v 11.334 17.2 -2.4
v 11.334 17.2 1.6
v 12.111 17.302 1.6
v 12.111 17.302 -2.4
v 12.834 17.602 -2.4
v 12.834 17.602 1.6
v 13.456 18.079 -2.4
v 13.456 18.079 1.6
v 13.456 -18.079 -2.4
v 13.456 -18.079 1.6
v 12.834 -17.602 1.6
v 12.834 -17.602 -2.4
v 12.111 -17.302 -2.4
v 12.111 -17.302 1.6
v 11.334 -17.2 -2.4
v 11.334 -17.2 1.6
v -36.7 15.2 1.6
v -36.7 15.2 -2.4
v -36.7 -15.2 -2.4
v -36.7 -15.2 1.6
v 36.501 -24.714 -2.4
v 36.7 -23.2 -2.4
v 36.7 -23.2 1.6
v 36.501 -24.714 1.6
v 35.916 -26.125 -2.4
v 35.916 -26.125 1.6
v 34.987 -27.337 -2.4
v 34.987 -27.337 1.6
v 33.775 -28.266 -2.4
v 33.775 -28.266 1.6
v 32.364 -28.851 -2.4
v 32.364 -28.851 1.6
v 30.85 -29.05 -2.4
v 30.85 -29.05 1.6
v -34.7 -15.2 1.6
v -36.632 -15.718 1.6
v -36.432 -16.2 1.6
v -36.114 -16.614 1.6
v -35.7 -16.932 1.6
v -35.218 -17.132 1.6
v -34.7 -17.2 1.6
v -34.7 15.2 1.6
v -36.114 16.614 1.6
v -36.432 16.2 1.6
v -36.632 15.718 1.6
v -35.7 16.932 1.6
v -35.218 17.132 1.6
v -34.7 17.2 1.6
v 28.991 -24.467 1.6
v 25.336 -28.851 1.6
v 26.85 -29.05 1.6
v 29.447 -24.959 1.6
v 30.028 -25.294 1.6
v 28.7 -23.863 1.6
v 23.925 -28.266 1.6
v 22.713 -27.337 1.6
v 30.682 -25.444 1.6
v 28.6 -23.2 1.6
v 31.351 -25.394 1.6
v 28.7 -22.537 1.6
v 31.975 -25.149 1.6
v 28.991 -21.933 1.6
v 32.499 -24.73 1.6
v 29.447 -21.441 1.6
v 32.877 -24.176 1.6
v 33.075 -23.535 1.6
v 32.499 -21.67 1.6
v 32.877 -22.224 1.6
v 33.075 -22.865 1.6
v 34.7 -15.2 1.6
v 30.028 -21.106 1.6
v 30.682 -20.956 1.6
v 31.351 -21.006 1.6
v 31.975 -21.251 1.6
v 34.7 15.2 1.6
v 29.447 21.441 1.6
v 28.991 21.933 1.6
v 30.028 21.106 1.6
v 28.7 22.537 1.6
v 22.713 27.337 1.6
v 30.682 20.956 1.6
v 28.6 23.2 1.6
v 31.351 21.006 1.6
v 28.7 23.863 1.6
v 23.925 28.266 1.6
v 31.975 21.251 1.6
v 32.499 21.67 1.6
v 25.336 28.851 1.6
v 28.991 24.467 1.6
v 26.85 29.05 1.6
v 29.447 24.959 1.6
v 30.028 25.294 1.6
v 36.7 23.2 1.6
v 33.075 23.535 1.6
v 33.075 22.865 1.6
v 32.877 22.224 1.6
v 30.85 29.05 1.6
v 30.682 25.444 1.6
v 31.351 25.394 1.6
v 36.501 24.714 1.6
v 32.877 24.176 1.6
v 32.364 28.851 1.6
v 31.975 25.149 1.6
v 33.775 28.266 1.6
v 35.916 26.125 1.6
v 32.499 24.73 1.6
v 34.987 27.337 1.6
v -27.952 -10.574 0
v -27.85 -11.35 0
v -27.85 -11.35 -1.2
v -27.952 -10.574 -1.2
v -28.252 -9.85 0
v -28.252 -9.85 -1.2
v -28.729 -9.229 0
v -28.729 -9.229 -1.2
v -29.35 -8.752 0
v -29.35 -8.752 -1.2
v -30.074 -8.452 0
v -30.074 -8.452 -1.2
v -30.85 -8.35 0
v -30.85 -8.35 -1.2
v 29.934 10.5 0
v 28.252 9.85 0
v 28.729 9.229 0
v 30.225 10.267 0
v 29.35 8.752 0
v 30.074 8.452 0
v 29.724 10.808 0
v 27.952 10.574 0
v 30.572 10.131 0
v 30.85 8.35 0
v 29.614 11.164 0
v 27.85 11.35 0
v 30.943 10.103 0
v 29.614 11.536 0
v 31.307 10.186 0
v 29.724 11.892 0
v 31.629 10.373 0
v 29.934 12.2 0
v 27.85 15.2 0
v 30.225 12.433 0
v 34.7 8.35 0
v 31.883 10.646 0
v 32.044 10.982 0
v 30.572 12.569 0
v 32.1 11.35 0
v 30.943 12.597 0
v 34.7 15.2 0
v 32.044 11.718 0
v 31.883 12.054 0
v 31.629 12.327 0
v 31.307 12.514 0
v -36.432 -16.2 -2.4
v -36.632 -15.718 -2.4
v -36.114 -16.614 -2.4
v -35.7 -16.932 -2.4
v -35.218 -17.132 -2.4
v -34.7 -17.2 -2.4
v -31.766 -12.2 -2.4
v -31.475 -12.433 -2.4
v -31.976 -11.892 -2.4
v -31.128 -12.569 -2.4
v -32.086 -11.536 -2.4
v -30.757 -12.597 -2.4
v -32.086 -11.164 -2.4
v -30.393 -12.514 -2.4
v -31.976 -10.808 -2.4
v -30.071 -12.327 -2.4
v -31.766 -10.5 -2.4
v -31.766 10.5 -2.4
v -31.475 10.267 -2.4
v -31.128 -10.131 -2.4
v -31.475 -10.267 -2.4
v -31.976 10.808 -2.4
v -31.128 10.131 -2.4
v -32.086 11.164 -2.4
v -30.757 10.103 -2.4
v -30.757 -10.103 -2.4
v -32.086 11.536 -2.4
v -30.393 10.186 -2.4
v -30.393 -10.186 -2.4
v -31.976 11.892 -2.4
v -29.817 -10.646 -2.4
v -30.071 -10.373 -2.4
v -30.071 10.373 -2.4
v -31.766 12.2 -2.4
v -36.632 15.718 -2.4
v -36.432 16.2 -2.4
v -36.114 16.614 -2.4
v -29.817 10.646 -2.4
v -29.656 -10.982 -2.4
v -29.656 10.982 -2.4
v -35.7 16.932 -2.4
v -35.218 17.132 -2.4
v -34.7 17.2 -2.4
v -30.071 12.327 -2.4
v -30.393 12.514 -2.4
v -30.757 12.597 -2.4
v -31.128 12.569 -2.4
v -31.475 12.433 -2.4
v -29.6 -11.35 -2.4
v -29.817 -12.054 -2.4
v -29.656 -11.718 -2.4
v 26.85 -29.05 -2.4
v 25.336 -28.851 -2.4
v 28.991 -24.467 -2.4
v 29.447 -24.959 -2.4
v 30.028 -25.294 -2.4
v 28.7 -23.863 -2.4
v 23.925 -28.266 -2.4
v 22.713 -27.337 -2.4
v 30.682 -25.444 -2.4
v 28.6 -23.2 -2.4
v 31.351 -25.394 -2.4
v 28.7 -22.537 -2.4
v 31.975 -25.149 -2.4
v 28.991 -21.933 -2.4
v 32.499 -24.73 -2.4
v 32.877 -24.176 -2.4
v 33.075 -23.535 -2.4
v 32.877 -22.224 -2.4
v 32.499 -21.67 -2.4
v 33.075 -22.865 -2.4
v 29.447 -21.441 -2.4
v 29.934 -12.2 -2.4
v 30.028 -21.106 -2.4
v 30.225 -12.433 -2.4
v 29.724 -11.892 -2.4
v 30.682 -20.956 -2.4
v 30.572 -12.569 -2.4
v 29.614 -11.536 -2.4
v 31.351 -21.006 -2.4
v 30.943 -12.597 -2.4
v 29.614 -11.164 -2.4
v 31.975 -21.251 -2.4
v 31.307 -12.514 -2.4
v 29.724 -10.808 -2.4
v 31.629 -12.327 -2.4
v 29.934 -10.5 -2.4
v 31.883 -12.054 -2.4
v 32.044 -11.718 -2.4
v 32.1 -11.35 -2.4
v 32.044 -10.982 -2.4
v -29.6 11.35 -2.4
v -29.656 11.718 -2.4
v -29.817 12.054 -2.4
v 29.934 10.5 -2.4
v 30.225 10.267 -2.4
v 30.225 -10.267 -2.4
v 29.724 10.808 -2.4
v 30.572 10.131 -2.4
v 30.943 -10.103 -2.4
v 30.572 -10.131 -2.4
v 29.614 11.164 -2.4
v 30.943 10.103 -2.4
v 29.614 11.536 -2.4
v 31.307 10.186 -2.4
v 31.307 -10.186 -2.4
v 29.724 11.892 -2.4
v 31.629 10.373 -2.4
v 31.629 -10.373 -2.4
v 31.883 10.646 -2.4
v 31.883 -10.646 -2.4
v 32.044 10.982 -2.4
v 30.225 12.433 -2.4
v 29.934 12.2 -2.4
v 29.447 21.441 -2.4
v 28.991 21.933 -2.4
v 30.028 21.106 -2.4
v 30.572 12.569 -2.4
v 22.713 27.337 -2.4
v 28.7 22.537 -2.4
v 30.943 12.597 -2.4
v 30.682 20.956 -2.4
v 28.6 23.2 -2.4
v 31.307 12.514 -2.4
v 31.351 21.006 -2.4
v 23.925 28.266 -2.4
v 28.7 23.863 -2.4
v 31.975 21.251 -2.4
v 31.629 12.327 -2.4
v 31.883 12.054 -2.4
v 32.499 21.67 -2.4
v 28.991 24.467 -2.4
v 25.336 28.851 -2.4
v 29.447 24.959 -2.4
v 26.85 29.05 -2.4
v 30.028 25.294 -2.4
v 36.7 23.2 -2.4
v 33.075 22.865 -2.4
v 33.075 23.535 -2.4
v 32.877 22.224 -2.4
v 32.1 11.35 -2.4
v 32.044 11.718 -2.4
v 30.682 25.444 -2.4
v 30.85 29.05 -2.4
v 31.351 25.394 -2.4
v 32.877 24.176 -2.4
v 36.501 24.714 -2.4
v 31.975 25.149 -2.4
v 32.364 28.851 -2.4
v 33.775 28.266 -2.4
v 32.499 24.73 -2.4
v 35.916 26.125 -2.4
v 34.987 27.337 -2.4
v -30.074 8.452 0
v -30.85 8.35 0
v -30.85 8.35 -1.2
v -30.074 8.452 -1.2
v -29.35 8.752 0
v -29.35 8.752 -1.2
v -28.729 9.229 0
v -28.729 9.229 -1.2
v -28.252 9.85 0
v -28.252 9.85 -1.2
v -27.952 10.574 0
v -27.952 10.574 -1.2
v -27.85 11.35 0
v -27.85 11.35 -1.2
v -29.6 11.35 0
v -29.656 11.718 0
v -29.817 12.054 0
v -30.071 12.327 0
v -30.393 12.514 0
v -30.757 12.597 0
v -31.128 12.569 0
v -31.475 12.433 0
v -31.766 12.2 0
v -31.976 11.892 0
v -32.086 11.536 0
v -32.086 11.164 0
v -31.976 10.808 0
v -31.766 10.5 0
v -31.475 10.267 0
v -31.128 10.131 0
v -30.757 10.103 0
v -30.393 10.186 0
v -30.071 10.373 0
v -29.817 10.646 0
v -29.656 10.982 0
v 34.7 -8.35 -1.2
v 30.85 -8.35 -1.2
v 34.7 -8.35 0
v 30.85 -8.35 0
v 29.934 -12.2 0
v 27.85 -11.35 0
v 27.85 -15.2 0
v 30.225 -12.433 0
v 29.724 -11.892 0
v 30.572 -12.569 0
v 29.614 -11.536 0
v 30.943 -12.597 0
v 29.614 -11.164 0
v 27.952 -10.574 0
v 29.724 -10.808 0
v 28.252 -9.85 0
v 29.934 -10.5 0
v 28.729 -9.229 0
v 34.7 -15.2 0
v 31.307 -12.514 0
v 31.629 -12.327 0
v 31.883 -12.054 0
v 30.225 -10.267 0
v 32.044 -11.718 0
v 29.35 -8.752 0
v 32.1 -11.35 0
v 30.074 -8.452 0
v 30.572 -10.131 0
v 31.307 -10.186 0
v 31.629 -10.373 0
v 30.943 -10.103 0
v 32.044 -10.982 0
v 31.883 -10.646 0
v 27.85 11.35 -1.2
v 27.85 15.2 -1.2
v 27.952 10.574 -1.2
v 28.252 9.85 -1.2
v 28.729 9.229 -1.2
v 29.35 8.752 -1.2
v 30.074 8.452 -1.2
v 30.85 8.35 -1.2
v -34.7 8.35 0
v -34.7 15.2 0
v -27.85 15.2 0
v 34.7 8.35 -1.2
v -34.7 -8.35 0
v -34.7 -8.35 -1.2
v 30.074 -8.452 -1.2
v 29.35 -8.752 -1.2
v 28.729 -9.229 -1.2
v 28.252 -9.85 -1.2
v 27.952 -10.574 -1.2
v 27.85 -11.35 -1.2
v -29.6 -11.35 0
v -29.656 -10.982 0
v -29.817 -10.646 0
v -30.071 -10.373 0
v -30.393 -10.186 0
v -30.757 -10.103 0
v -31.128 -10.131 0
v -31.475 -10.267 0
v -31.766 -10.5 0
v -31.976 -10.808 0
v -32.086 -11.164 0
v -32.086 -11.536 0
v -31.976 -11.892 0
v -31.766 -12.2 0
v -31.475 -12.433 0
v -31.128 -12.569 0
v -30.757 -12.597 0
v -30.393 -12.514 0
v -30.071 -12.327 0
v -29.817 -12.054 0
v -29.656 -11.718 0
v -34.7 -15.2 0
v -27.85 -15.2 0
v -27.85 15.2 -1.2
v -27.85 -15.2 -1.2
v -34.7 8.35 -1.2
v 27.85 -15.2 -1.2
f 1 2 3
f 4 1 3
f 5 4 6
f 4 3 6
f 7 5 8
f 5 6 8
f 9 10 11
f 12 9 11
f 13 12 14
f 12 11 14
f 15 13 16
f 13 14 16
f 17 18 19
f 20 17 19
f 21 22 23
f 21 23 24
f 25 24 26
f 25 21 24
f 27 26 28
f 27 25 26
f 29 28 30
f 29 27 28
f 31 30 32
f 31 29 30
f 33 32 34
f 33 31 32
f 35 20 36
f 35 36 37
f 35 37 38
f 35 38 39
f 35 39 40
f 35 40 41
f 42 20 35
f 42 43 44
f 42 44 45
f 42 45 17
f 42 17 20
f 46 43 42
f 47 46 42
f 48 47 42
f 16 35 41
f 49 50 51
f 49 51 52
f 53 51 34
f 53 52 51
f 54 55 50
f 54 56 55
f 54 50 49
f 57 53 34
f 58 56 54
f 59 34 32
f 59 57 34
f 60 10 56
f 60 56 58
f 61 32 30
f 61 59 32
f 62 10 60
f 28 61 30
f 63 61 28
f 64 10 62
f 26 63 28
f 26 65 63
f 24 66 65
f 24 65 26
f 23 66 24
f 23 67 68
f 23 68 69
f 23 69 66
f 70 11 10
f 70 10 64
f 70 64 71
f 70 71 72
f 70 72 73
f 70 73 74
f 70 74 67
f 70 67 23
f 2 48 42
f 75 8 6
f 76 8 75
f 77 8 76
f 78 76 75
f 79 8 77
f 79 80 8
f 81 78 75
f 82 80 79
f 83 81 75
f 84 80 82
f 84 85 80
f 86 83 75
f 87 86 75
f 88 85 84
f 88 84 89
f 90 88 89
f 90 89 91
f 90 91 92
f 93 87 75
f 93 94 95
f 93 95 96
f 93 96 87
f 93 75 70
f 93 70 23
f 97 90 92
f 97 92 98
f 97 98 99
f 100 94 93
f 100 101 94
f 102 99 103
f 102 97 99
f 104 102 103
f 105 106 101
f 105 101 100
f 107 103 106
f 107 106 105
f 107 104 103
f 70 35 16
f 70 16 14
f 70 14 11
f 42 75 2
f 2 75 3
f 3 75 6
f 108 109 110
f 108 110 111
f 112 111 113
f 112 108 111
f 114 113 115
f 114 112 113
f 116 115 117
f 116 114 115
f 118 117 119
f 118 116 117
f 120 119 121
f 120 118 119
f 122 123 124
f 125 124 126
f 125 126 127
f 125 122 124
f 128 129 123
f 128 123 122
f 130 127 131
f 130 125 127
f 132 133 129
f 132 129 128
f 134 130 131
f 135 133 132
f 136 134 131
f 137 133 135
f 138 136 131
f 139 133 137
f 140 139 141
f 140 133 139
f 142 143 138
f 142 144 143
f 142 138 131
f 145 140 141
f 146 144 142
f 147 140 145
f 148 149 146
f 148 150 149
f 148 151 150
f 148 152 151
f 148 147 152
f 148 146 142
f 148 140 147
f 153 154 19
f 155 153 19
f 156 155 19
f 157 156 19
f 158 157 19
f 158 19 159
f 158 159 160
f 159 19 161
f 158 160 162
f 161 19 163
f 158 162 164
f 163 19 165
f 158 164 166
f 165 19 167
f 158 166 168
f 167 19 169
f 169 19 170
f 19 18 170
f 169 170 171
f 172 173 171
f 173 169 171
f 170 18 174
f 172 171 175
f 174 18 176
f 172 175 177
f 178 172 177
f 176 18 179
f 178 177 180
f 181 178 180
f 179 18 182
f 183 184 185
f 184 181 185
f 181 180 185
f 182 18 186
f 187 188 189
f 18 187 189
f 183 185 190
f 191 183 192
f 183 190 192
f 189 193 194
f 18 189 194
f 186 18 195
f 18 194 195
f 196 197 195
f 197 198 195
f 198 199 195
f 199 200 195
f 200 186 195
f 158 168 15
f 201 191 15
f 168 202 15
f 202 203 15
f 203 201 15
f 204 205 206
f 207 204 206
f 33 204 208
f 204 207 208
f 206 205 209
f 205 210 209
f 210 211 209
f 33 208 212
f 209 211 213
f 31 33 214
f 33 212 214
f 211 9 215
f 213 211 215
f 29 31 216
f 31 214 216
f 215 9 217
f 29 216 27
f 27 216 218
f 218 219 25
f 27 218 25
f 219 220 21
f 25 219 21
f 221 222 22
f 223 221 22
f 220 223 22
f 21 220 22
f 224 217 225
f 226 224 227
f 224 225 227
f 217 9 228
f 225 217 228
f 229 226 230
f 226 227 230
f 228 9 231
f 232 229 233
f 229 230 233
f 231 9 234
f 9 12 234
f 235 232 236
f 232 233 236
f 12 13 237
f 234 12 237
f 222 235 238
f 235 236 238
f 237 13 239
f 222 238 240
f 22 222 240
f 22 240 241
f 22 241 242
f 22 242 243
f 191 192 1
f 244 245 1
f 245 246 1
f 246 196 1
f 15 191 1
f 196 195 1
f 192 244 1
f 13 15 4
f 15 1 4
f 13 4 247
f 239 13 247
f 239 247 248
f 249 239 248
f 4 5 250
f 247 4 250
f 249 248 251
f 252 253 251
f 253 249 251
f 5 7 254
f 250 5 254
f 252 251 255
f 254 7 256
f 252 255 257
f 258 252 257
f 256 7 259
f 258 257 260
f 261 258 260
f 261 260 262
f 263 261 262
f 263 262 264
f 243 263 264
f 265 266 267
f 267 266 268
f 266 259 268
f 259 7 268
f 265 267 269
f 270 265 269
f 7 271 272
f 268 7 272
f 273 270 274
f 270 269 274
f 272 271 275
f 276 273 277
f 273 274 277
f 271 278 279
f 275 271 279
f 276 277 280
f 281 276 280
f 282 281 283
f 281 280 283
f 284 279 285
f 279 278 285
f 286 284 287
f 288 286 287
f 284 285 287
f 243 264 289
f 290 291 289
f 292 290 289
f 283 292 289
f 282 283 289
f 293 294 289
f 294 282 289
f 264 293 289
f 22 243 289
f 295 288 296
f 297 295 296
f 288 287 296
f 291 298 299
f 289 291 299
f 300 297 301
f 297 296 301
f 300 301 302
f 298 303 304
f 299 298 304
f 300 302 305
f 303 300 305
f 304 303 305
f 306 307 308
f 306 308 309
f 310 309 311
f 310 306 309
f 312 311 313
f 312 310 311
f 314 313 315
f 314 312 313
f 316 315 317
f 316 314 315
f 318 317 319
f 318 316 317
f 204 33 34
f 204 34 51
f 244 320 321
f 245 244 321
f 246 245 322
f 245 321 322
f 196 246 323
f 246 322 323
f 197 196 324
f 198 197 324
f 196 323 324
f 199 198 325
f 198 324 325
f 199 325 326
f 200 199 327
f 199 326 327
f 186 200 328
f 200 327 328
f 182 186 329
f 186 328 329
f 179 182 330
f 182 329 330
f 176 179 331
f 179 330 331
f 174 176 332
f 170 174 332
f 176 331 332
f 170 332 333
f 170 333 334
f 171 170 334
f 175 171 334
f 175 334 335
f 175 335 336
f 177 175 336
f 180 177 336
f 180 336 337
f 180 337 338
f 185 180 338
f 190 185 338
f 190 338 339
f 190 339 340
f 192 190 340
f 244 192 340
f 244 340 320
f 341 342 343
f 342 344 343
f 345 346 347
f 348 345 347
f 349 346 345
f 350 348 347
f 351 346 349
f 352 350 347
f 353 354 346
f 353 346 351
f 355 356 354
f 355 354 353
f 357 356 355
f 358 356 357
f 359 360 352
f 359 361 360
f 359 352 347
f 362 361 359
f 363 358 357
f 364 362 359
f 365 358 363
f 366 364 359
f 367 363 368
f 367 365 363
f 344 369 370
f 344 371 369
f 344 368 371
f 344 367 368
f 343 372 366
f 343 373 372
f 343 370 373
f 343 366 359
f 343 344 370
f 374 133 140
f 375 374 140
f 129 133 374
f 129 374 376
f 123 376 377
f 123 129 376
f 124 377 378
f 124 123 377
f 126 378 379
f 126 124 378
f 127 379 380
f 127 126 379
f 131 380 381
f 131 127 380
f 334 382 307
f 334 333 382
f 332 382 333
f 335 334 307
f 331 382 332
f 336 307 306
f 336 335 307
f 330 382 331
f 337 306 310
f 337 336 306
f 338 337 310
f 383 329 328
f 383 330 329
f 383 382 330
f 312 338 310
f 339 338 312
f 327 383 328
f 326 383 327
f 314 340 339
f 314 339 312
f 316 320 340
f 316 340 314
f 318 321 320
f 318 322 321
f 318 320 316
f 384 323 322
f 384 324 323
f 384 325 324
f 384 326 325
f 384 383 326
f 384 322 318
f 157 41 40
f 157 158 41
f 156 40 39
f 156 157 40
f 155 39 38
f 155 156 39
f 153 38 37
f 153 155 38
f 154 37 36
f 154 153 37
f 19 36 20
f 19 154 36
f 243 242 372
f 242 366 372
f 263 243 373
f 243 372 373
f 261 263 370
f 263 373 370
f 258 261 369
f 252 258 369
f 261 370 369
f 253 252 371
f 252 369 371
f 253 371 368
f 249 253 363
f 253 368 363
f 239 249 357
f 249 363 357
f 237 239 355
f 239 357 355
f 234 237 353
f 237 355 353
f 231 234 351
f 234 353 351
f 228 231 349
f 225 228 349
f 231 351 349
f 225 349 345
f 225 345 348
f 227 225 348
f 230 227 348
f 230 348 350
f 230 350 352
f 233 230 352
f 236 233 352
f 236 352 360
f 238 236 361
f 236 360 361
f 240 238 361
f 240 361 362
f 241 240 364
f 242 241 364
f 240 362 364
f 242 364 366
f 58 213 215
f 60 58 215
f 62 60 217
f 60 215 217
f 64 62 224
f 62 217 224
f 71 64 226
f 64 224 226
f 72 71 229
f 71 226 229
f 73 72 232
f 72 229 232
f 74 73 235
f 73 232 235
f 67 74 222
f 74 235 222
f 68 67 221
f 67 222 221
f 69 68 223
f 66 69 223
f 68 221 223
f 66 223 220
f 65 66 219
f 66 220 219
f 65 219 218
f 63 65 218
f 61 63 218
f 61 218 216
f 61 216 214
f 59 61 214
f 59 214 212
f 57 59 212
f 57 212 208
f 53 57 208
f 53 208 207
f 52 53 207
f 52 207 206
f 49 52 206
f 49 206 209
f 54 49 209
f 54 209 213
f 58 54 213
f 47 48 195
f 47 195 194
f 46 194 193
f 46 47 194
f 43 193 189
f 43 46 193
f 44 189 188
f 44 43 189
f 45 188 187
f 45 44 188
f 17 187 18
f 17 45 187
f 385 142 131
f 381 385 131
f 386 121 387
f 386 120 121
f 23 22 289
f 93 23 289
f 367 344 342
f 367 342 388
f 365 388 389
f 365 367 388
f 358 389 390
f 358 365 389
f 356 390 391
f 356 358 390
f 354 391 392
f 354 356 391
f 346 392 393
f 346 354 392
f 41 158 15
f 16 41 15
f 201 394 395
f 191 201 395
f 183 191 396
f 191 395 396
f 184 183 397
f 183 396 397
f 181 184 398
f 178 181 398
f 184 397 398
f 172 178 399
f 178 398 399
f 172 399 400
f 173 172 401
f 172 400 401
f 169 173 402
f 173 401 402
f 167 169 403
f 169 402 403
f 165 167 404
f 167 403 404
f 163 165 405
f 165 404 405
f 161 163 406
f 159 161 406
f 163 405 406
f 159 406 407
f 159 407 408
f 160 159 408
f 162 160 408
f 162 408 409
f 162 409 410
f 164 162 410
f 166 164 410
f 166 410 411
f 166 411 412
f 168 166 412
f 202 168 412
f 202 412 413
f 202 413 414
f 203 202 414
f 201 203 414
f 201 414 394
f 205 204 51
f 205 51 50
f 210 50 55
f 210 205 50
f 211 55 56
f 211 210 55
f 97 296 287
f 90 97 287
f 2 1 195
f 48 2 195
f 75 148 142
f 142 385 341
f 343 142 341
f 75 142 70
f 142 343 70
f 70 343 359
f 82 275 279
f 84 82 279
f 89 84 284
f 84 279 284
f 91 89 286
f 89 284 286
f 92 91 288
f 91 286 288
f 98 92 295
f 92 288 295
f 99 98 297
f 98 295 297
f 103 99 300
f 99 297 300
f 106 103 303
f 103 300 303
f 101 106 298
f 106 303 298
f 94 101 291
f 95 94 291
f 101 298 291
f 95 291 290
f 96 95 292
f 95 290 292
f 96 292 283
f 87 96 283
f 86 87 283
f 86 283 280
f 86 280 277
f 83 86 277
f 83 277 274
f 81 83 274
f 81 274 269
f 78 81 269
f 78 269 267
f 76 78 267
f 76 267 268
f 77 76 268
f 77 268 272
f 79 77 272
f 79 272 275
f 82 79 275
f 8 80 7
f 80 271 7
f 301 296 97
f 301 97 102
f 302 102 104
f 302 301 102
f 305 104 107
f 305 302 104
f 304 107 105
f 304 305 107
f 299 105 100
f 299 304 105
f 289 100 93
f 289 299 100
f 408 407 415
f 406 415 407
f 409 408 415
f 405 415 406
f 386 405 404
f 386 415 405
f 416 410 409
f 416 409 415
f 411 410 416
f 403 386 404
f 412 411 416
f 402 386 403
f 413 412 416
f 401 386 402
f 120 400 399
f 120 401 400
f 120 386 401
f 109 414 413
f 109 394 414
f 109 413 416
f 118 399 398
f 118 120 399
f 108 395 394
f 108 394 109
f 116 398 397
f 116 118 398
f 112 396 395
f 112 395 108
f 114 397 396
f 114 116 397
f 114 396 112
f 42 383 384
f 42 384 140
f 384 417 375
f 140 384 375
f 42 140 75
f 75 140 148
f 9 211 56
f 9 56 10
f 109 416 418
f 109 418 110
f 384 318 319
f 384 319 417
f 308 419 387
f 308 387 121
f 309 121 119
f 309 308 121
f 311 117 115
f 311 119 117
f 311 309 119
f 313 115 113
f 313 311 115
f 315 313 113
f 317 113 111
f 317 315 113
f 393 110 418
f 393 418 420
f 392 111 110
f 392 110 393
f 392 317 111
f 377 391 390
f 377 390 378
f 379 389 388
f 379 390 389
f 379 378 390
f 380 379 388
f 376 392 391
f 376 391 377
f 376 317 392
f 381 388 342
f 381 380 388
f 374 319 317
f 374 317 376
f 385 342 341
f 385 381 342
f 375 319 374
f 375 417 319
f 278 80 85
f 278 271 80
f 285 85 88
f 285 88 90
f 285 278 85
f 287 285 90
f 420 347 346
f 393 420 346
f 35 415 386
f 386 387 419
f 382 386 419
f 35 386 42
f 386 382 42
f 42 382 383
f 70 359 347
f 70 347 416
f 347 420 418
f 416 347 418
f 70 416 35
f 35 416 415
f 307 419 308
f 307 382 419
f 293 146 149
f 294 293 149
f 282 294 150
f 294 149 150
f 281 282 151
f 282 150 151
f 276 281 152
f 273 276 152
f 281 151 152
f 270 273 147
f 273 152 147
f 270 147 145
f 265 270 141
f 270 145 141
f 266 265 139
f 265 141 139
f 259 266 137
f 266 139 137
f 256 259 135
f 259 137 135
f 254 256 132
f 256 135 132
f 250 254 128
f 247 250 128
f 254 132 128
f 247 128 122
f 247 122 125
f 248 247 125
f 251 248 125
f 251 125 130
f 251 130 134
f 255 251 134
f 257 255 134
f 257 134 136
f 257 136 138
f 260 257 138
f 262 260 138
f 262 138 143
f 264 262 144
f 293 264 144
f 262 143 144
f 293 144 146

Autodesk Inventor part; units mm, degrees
ref_plane "YZ Plane" through (0, 0, 0) normal (1, 0, 0) x (0, 1, 0)
ref_plane "XZ Plane" through (0, 0, 0) normal (0, 1, 0) x (-1, 0, 0)
ref_plane "XY Plane" through (0, 0, 0) normal (0, 0, 1) x (1, 0, 0)
sketch "スケッチ1" plane through (0, 0, 0) normal (0, 0, 1) x (1, 0, 0)
  line L0 (-34.7, 15.2) -> (34.7, 15.2)
  line L1 (34.7, 15.2) -> (34.7, -15.2)
  line L2 (34.7, -15.2) -> (-34.7, -15.2)
  line L3 (-34.7, -15.2) -> (-34.7, 15.2)
  line L4 (-30.85, 11.35) -> (30.85, 11.35) construction
  line L5 (30.85, 11.35) -> (30.85, -11.35) construction
  line L6 (30.85, -11.35) -> (-30.85, -11.35) construction
  line L7 (-30.85, -11.35) -> (-30.85, 11.35) construction
  circle A0 centre (-30.85, 11.35) radius 1.25
  circle A1 centre (-30.85, -11.35) radius 1.25
  circle A2 centre (30.85, -11.35) radius 1.25
  circle A3 centre (30.85, 11.35) radius 1.25
  line L8 (36.7, 17.2) -> (-36.7, 17.2)
  line L9 (-36.7, 17.2) -> (-36.7, -17.2)
  line L10 (-36.7, -17.2) -> (36.7, -17.2)
  line L11 (36.7, -17.2) -> (36.7, 17.2)
  point P0 (0, 0)
  point P1 (0, 15.2)
  point P2 (-34.7, 0)
  point P3 (0, 11.35)
  point P4 (-30.85, 0)
  dimension "d0" = 30.4
  dimension "d1" = 69.4
  dimension "d2" = 61.7
  dimension "d3" = 22.7
  dimension "d4" = 2.5
  dimension "d5" = 2
extrude "押し出し1" add sketch "スケッチ1" along normal blind 1.6 contours L11 L10 L9 L8
extrude "押し出し2" add sketch "スケッチ1" against normal blind 2.4 contours L0 L1 L2 L3 | L11 L10 L9 L8
sketch "スケッチ2" plane through (0, 0, 0) normal (0, 0, 1) x (1, 0, 0)
  circle A0 centre (-30.85, -11.35) radius 1.25 construction
  circle A1 centre (-30.85, 11.35) radius 1.25 construction
  circle A2 centre (30.85, -11.35) radius 1.25 construction
  circle A3 centre (30.85, 11.35) radius 1.25 construction
  line L0 (-34.7, -15.2) -> (-34.7, 15.2) projected
  line L1 (34.7, -15.2) -> (-34.7, -15.2) projected
  line L2 (-34.7, 15.2) -> (34.7, 15.2) projected
  line L3 (34.7, 15.2) -> (34.7, -15.2) projected
  line L4 (-27.85, -15.2) -> (-27.85, -11.35)
  arc A4 (-27.85, -11.35) -> (-30.85, -8.35) centre (-30.85, -11.35) ccw
  line L5 (-30.85, -8.35) -> (-34.7, -8.35)
  line L6 (-34.7, 8.35) -> (-30.85, 8.35)
  arc A5 (-30.85, 8.35) -> (-27.85, 11.35) centre (-30.85, 11.35) ccw
  line L7 (-27.85, 11.35) -> (-27.85, 15.2)
  line L8 (27.85, -15.2) -> (27.85, -11.35)
  arc A6 (30.85, -8.35) -> (27.85, -11.35) centre (30.85, -11.35) ccw
  line L9 (30.85, -8.35) -> (34.7, -8.35)
  line L10 (34.7, 8.35) -> (30.85, 8.35)
  arc A7 (27.85, 11.35) -> (30.85, 8.35) centre (30.85, 11.35) ccw
  line L11 (27.85, 11.35) -> (27.85, 15.2)
  point P0 (0, 0)
  dimension "d10" = 3
extrude "押し出し3" cut sketch "スケッチ2" against normal blind 1.2 contours L0 L6 A5 L7 L2 L11 A7 L10 L3 L9 A6 L8 L1 L4 A4 L5
sketch "スケッチ3" plane through (0, 0, -2.4) normal (0, 0, -1) x (-1, 0, 0)
  circle A0 centre (-30.85, 11.35) radius 1.25 construction
  circle A1 centre (-30.85, -11.35) radius 1.25 construction
  line L0 (-30.85, 23.2) -> (-30.85, -23.2) construction
  line L1 (-25, 23.2) -> (-25, -23.2)
  line L2 (-36.7, -23.2) -> (-36.7, 23.2)
  arc A2 (-25, 23.2) -> (-36.7, 23.2) centre (-30.85, 23.2) ccw
  arc A3 (-36.7, -23.2) -> (-25, -23.2) centre (-30.85, -23.2) ccw
  line L3 (36.7, 17.2) -> (-36.7, 17.2) projected
  line L4 (-36.7, -17.2) -> (36.7, -17.2) projected
  circle A4 centre (-30.85, 23.2) radius 2.25
  circle A5 centre (-30.85, -23.2) radius 2.25
  line L5 (-30.85, 29.05) -> (-26.85, 29.05)
  arc A6 (-22.7134, 27.3366) -> (-26.85, 29.05) centre (-26.85, 23.2) ccw
  line L6 (-22.7134, 27.3366) -> (-12.5769, 17.2)
  line L7 (-36.7, 17.2) -> (36.7, 17.2) projected
  line L8 (-30.85, -29.05) -> (-26.85, -29.05)
  arc A7 (-26.85, -29.05) -> (-22.7134, -27.3366) centre (-26.85, -23.2) ccw
  line L9 (-22.7134, -27.3366) -> (-12.5769, -17.2)
  point P0 (0, 0)
  point P1 (-30.85, 0)
  dimension "d14" = 6
  dimension "d15" = 6
  dimension "d16" = 46.4
  dimension "d17" = 4.5
  dimension "d18" = 45
  dimension "d19" = 4
extrude "押し出し4" add sketch "スケッチ3" against normal up to surface (4 mm away) contours A2 L5 A6 L6 L3 L1 | L1 L3 L2 A2 | L4 L9 A7 L8 A3 L1 | L1 A3 L2 L4
fillet "フィレット2" radius 3 2 edges at (12.5769, -17.2, -0.4) (12.5769, 17.2, -0.4)
fillet "フィレット1" radius 2 2 edges at (-36.7, 17.2, -0.4) (-36.7, -17.2, -0.4)
equation "\"d15\" = d14"
properties part number "power_sync_module_case"
